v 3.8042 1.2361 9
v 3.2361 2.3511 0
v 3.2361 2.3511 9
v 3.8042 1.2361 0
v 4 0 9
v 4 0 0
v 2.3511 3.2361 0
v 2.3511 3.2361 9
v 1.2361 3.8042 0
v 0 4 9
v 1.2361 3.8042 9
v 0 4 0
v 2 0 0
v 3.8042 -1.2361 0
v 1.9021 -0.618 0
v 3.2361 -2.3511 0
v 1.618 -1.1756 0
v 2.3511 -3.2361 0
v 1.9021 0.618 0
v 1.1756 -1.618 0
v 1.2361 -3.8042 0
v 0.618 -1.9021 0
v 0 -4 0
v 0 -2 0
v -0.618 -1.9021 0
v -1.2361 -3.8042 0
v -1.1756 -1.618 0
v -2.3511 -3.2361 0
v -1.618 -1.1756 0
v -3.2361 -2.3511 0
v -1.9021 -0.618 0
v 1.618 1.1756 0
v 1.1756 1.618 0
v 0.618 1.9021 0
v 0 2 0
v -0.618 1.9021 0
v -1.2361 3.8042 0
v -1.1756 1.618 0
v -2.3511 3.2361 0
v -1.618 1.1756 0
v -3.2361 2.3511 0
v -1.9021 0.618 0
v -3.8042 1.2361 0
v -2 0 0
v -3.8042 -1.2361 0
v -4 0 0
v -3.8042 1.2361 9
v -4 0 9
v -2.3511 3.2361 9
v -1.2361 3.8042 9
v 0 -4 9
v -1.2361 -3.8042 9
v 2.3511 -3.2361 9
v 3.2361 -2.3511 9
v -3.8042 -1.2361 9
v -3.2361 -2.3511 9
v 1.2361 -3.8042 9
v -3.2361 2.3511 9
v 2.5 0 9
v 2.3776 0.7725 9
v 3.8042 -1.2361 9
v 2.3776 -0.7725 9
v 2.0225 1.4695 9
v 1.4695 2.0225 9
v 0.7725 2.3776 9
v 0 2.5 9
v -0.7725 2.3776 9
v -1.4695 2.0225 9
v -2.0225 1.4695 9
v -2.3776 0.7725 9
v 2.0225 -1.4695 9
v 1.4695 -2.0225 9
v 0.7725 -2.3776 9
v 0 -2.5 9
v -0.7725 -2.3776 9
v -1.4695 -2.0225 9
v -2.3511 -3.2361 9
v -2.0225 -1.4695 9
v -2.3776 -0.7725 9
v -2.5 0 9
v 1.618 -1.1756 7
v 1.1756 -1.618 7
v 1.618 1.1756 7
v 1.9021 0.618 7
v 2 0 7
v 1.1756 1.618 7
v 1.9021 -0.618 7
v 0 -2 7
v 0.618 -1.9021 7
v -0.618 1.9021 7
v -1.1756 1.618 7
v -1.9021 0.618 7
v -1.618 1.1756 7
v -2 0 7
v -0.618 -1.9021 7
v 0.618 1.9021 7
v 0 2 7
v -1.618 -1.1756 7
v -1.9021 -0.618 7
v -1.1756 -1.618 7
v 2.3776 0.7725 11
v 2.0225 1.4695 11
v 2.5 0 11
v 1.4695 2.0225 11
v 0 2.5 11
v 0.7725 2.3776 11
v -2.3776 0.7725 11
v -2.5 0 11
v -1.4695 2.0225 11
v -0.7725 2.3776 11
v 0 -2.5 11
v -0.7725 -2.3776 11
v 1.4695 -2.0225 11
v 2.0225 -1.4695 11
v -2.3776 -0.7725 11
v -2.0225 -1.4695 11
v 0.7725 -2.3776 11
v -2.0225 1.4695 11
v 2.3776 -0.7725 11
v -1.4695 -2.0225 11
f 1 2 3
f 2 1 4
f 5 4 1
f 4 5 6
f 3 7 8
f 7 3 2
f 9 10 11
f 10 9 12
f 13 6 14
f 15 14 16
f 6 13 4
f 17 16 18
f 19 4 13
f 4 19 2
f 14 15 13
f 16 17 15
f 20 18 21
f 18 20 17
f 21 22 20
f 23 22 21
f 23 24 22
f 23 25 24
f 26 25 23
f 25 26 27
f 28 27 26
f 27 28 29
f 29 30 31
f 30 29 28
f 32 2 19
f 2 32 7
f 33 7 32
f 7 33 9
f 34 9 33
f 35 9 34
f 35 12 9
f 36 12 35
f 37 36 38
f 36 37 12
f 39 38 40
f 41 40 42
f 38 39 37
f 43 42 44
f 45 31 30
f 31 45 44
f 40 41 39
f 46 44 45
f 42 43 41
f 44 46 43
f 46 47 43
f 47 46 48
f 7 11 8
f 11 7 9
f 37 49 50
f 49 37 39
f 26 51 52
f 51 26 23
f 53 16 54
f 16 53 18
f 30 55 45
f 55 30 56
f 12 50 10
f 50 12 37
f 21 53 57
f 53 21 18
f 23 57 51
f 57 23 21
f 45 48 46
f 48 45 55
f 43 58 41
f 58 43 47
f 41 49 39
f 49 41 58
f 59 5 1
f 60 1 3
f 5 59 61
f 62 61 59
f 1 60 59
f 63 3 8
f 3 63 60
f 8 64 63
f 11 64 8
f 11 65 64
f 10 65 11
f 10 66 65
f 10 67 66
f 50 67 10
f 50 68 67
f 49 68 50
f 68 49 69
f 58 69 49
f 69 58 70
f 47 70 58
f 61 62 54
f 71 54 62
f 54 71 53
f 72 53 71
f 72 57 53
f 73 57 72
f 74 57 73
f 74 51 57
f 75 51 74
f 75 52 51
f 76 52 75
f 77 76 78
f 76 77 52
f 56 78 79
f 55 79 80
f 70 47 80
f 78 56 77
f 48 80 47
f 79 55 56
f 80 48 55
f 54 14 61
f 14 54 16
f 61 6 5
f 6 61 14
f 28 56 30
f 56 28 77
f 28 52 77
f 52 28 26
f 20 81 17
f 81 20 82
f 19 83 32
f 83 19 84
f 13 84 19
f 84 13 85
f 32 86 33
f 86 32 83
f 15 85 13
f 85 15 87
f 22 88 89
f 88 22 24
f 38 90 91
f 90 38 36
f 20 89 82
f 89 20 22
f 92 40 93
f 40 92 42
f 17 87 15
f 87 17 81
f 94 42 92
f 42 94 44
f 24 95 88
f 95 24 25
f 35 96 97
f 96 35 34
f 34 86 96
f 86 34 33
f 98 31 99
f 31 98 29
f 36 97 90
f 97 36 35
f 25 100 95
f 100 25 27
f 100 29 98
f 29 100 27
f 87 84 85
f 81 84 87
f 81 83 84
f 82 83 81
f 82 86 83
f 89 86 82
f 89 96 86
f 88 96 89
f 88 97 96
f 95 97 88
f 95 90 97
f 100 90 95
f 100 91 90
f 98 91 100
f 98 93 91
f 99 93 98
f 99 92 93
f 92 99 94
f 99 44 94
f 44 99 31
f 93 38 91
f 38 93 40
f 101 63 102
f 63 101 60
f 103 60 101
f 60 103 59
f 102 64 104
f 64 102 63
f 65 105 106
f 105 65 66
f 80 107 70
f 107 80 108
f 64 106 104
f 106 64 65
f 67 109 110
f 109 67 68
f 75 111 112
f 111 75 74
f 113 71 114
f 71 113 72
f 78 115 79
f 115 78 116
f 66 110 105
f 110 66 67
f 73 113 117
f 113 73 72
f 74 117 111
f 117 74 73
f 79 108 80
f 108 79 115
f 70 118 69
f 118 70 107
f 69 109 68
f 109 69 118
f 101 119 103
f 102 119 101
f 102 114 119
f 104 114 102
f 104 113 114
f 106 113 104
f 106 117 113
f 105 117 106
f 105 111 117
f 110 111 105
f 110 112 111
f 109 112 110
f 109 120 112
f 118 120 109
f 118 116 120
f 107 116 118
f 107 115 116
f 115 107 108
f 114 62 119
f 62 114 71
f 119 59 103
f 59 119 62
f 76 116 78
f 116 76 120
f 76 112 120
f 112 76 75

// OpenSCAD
 branch(0);

module branch(index){
    dims=[[4,8,5,9,7],[6,11,5,10,8]];
    od=dims[index][1];spigot=dims[index][2];length=dims[index][3];depth=dims[index][4];bore=dims[index][0];
    difference(){
        cylinder(h=length,d=od,$fn=20);
        cylinder(h=depth,d=bore,$fn=20);
    }
    translate([0,0,length])cylinder(h=2,d=spigot,$fn=20);
}
